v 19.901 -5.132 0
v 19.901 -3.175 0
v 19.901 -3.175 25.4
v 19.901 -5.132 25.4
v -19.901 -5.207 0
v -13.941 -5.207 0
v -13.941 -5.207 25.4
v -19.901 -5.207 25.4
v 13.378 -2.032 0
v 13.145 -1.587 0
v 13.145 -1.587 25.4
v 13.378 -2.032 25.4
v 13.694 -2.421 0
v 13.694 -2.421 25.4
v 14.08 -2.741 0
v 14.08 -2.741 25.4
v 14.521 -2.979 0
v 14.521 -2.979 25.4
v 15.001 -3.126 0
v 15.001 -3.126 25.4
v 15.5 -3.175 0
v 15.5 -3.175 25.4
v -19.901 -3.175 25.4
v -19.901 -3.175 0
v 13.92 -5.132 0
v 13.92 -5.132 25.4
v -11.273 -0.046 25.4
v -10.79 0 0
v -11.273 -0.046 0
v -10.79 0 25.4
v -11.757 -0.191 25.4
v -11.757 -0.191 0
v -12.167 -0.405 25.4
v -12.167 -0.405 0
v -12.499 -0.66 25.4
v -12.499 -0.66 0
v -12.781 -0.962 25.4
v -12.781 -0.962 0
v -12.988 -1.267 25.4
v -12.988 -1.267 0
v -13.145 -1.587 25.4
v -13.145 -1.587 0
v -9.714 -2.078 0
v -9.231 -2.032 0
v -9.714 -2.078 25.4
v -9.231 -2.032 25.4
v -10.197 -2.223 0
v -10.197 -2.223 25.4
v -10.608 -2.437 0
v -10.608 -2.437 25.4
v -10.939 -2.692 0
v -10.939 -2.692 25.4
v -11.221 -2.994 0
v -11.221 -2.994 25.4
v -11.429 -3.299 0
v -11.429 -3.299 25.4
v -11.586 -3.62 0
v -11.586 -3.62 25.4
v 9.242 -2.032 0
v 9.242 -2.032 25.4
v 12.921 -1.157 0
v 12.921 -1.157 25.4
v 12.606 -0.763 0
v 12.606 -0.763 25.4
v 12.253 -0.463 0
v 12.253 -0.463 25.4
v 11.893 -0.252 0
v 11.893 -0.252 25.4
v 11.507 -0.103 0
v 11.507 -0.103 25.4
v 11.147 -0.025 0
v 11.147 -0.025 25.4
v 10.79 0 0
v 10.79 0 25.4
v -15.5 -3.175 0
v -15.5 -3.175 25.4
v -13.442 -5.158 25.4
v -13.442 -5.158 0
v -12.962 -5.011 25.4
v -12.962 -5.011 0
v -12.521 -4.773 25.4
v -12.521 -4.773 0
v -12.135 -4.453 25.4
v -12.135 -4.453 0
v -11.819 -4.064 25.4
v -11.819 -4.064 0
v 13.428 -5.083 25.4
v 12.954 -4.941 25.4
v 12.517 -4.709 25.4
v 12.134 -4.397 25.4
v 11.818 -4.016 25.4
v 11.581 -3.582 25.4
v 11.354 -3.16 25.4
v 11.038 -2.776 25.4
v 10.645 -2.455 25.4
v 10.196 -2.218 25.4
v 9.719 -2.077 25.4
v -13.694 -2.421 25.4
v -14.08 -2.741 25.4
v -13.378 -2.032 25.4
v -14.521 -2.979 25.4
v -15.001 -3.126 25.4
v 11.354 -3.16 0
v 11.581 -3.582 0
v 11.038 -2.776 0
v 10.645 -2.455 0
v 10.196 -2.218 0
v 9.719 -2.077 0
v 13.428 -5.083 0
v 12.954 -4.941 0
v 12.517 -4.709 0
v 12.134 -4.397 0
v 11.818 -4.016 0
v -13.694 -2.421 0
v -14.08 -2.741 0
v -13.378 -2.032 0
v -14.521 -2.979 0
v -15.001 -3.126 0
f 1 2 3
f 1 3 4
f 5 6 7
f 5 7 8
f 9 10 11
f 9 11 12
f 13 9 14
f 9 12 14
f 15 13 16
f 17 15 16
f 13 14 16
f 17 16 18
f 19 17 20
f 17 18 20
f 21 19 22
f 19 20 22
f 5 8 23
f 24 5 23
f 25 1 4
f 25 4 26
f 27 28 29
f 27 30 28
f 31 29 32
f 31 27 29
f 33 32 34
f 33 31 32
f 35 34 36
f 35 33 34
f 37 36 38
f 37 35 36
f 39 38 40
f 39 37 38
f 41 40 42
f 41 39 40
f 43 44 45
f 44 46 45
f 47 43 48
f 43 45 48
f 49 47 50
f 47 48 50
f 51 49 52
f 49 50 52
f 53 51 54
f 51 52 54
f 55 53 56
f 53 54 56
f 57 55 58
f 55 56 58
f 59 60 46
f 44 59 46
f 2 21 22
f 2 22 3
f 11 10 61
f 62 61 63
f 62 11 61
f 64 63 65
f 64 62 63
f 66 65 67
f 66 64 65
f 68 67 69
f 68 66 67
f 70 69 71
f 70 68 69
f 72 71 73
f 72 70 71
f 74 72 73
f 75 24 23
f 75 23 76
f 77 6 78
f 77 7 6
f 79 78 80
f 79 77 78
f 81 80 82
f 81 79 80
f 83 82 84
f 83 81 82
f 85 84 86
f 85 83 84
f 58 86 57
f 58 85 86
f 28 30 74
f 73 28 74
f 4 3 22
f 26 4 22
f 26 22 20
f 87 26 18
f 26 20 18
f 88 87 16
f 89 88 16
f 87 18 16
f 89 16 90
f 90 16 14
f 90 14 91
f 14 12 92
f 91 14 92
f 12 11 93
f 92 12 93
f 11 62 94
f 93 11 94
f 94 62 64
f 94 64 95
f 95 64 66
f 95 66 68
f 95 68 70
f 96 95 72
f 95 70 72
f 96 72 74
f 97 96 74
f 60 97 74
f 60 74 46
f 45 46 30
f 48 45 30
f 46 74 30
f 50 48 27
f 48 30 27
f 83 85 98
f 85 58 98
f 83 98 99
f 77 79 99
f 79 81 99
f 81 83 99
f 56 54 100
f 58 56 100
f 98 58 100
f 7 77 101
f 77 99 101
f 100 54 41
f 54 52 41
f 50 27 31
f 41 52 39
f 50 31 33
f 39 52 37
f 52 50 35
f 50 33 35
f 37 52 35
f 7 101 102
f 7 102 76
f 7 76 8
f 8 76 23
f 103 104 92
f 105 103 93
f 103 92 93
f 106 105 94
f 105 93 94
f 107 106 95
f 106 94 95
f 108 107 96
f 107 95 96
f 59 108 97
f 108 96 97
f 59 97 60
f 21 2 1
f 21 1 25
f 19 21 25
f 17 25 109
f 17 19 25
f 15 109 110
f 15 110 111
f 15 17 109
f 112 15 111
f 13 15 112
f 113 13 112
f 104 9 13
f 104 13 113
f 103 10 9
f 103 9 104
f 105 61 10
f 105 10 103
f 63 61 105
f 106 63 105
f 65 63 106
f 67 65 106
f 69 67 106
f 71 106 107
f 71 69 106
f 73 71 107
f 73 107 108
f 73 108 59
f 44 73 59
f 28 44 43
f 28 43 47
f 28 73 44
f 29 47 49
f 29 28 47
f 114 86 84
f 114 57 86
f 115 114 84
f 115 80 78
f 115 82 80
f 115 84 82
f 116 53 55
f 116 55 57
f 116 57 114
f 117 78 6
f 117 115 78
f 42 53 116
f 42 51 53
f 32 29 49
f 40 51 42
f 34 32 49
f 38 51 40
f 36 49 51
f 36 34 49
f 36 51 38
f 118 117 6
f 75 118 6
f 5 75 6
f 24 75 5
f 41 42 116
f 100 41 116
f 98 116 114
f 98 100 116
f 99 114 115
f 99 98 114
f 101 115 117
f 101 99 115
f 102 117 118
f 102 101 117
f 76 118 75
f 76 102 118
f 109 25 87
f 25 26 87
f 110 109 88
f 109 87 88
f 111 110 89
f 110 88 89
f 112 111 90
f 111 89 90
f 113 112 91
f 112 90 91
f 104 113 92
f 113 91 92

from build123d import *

# Parameters (mm, degrees)
BOSS_EXTRUDE1_DEPTH = 25.4
FILLET1_R           = 2.54
FILLET2_R           = 2.54
FILLET3_R           = 2.54
FILLET5_R           = 2.54
FILLET6_R           = 2.54


with BuildPart() as part:
    # Sketch1 → Boss-Extrude1 (new body)
    with BuildSketch(Plane.XY):
        Polygon((-12.7, 0), (12.7, 0), (13.550738686, -3.175), (19.900738686, -3.175), (19.900738686, -5.131589334), (11.971324019, -5.131589334), (11.14079156, -2.032), (-11.14079156, -2.032), (-11.991530246, -5.207), (-19.900738686, -5.207), (-19.900738686, -3.175), (-13.550738686, -3.175), align=None)
    extrude(amount=BOSS_EXTRUDE1_DEPTH)

    # Fillet1
    fillet1_edges = [part.edges().sort_by_distance(p)[0] for p in [
        (13.550738686, -3.175, 12.7),
    ]]
    fillet(fillet1_edges, radius=FILLET1_R)

    # Fillet2
    fillet2_edges = [part.edges().sort_by_distance(p)[0] for p in [
        (12.7, 0, 12.7),
    ]]
    fillet(fillet2_edges, radius=FILLET2_R)

    # Fillet3
    fillet3_edges = [part.edges().sort_by_distance(p)[0] for p in [
        (-11.991530246, -5.207, 12.7),
        (11.971324019, -5.131589334, 12.7),
    ]]
    fillet(fillet3_edges, radius=FILLET3_R)

    # Fillet5
    fillet5_edges = [part.edges().sort_by_distance(p)[0] for p in [
        (-13.550738686, -3.175, 12.7),
        (11.14079156, -2.032, 12.7),
        (-11.14079156, -2.032, 12.7),
    ]]
    fillet(fillet5_edges, radius=FILLET5_R)

    # Fillet6
    fillet6_edges = [part.edges().sort_by_distance(p)[0] for p in [
        (-12.7, 0, 12.7),
    ]]
    fillet(fillet6_edges, radius=FILLET6_R)


solid = part.part
